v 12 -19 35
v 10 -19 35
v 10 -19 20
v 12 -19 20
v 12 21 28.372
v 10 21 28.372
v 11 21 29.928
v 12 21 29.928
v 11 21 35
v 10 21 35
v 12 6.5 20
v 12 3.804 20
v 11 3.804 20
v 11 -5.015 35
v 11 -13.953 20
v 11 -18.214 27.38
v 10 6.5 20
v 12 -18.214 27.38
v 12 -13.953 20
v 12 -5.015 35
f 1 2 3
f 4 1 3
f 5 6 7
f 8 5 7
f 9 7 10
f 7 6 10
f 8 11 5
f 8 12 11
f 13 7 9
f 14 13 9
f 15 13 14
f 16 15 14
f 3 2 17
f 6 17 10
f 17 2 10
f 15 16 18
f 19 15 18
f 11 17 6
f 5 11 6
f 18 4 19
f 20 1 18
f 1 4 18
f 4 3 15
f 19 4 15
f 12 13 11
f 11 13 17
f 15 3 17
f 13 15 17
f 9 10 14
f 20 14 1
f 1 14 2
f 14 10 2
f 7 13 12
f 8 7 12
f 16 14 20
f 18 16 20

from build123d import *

# Parameters (mm, degrees)
SKETCH024_W             = 5
SKETCH024_H             = 17.4
EXTRUDE021_DEPTH        = 1.5
EXTRUDE021_DEPTH_BACK   = 60
BODY009_PLACEMENT_ANGLE = 30
EXTRUDE020_DEPTH        = 2


with BuildPart() as body009:
    # Sketch024 → Extrude021 (new body, two sides)
    with BuildSketch(Plane.XZ.offset(29)) as extrude021_sk:
        with Locations((10.5, 7.5)):
            Rectangle(SKETCH024_W, SKETCH024_H)
    extrude(amount=EXTRUDE021_DEPTH)
    extrude(extrude021_sk.sketch, amount=-EXTRUDE021_DEPTH_BACK)


with BuildPart() as body009_1:
    # Body009 placement: moved
    add(body009.part.moved(Location((3, 16.3, 28.6))).rotate(Axis((3, 16.3, 28.6), (1, 0, 0)), BODY009_PLACEMENT_ANGLE))


with BuildPart() as cut:
    # Sketch023 → Extrude020 (new body)
    with BuildSketch(Plane(origin=(0, 0, 0), x_dir=(0, -1, 0), z_dir=(-1, 0, 0))):
        Polygon((19, 35), (19, 20), (-6.5, 20), (-21, 28.371579), (-21, 35), align=None)
    extrude(amount=-EXTRUDE020_DEPTH)


with BuildPart() as cut_1:
    # Extrude020 placement: moved
    add(cut.part.moved(Location((10, 0, 0))))

    # Cut: cut Body009
    add(body009_1.part, mode=Mode.SUBTRACT)


solid = cut_1.part
